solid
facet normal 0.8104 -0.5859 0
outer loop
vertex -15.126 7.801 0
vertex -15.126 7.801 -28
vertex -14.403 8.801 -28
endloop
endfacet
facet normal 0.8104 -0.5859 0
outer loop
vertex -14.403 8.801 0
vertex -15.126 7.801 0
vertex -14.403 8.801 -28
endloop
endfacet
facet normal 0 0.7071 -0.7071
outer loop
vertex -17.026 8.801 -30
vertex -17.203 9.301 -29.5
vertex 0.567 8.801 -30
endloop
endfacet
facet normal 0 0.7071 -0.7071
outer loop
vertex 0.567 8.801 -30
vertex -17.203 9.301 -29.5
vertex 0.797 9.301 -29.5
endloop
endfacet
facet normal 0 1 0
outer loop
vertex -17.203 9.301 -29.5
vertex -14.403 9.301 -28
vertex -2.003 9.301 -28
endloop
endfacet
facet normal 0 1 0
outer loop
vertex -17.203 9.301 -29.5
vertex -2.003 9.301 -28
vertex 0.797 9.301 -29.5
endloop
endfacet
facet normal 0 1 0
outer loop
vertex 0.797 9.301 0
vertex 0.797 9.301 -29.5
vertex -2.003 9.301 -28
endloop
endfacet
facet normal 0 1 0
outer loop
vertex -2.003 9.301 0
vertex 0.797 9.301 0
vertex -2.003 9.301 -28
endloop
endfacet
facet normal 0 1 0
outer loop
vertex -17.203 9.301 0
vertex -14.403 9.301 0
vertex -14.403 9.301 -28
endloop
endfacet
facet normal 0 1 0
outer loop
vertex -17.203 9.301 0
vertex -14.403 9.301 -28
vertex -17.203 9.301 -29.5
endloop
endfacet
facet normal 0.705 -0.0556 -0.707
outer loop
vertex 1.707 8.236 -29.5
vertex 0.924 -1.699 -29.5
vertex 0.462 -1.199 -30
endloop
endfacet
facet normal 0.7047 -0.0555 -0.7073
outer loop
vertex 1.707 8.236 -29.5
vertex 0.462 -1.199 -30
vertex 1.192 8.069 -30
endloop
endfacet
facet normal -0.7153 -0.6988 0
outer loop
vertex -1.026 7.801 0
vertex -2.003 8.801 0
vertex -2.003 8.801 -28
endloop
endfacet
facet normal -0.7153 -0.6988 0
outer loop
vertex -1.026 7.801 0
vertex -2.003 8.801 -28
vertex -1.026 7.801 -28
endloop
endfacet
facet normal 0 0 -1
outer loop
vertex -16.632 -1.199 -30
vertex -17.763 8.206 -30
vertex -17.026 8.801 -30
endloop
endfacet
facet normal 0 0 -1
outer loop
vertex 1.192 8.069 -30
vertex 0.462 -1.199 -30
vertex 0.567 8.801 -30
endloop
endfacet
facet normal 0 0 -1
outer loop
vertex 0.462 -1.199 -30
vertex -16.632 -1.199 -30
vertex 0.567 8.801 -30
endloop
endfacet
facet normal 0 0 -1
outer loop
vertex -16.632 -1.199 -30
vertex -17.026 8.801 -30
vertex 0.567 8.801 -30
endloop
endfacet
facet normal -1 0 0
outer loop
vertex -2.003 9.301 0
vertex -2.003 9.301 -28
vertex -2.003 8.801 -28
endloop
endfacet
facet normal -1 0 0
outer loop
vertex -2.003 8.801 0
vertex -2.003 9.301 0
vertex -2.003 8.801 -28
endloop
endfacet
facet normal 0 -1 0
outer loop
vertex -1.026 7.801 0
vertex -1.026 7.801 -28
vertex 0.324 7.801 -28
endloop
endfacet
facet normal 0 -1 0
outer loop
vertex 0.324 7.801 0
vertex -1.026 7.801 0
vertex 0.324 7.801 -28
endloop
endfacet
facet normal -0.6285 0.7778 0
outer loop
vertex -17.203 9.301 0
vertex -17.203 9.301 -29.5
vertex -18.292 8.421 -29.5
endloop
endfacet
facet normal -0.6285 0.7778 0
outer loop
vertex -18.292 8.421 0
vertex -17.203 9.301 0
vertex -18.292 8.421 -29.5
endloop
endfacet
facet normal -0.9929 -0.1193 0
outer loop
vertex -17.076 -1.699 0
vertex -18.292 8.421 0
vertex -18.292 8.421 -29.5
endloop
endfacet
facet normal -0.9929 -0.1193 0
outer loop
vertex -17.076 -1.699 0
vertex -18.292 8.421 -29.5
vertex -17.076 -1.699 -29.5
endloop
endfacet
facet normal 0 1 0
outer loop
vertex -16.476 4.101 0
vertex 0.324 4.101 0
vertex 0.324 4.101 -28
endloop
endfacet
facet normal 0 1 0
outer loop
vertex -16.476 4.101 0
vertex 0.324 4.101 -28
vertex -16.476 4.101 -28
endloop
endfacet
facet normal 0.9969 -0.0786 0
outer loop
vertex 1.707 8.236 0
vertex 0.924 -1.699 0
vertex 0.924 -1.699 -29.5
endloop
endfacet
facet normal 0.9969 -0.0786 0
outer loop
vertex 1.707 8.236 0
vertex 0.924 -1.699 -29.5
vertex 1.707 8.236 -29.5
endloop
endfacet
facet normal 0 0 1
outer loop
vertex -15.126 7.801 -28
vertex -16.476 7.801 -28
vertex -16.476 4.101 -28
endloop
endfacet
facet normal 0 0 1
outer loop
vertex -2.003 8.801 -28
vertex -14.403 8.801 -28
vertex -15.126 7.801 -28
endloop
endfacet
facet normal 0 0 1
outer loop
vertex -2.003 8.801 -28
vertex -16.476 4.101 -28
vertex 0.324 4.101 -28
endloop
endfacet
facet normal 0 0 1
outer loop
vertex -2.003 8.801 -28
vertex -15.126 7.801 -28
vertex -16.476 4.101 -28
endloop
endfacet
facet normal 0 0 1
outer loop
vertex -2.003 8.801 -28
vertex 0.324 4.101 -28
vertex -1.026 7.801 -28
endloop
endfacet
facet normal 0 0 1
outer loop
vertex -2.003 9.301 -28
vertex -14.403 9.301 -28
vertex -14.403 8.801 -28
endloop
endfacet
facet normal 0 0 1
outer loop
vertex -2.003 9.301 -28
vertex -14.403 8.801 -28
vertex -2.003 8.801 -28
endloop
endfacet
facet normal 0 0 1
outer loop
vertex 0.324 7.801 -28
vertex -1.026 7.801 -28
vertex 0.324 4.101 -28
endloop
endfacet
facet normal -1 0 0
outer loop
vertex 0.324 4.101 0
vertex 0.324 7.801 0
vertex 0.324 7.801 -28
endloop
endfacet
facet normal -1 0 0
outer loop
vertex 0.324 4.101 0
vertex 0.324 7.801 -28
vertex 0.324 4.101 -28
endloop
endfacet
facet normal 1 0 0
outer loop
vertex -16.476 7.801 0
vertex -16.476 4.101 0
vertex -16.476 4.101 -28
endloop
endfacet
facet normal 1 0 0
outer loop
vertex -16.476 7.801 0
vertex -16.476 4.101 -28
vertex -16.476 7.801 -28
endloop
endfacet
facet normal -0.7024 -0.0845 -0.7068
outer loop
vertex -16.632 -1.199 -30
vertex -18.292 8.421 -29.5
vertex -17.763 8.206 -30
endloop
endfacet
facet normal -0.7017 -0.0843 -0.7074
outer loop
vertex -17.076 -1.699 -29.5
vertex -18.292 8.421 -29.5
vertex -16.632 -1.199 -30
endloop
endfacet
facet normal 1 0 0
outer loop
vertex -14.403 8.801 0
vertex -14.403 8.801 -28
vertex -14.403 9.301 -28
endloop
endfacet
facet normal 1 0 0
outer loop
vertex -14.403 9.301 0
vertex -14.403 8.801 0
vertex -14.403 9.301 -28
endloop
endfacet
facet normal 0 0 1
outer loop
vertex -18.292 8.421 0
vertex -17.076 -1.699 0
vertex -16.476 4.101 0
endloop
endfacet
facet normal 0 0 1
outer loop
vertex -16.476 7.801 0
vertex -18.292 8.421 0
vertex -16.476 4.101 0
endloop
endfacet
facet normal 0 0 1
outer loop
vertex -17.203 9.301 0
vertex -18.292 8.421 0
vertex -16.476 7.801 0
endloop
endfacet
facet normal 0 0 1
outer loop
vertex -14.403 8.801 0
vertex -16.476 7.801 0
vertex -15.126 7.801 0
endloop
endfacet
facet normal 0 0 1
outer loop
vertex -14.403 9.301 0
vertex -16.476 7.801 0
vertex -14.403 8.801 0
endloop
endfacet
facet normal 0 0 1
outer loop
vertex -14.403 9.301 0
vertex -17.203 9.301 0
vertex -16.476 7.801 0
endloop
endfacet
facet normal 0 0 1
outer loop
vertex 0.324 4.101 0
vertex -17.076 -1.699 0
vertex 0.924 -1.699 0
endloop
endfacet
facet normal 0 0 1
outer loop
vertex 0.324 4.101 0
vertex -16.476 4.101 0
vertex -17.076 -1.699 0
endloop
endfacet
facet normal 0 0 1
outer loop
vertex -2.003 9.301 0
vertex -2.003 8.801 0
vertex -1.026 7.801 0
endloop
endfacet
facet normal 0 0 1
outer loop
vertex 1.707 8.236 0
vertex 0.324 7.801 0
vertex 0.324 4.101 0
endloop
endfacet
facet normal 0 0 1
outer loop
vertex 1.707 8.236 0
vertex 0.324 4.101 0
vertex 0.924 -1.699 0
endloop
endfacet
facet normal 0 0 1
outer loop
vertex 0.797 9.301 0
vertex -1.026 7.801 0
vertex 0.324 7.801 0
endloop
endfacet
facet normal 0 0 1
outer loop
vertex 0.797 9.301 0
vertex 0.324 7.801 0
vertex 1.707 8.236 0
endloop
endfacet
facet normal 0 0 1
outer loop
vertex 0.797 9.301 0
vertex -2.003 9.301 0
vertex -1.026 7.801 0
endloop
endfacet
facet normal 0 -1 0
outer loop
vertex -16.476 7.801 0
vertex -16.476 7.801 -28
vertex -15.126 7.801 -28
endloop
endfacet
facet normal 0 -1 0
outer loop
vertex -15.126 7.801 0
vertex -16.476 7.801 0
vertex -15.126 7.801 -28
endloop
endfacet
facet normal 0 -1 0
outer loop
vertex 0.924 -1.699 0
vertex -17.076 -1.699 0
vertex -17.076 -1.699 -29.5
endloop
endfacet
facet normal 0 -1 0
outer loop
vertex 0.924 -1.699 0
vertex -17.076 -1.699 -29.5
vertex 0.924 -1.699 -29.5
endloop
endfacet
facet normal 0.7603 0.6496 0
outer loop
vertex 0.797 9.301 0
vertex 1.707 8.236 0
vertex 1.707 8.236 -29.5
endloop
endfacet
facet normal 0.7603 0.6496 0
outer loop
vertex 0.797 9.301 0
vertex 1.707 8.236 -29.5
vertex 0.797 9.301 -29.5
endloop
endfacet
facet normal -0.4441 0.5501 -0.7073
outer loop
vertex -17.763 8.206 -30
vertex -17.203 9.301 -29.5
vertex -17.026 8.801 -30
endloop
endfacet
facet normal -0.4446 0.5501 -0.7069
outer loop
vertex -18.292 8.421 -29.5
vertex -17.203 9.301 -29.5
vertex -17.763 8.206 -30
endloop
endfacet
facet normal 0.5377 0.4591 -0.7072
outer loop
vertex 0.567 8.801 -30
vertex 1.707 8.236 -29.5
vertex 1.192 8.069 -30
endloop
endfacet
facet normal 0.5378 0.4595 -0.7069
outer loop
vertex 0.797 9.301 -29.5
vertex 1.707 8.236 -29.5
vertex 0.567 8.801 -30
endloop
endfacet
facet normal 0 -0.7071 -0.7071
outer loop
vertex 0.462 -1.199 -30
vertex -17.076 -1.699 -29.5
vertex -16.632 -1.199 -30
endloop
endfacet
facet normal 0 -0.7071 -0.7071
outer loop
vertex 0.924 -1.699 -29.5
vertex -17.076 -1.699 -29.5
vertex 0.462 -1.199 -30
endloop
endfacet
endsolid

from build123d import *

# Parameters (mm, degrees)
BOSS_EXTRUDE1_DEPTH = 30
BOSS_EXTRUDE2_DEPTH = 2
CHAMFER8_SIZE       = 0.5


with BuildPart() as part:
    # Sketch1 → Boss-Extrude1 (new body)
    with BuildSketch(Plane.XY):
        Polygon((-17.075998832, -1.699461634), (0.924001168, -1.699461634), (1.706939946, 8.236405705), (0.797202797, 9.300538366), (-2.002797203, 9.300538366), (-2.002797203, 8.800538366), (-1.025998832, 7.800538366), (0.324001168, 7.800538366), (0.324001168, 4.100538366), (-16.475998832, 4.100538366), (-16.475998832, 7.800538366), (-15.125998832, 7.800538366), (-14.402797203, 8.800538366), (-14.402797203, 9.300538366), (-17.202797203, 9.300538366), (-18.292206063, 8.421227081), align=None)
    extrude(amount=-BOSS_EXTRUDE1_DEPTH)

    # Sketch2 → Boss-Extrude2 (add)
    with BuildSketch(Plane(origin=(0, 0, -30), x_dir=(-1, 0, 0), z_dir=(0, 0, -1))):
        Polygon((2.002797203, 9.300538366), (14.402797203, 9.300538366), (16.475998832, 9.300538366), (16.475998832, 4.100538366), (-0.324001168, 4.100538366), (-0.324001168, 9.300538366), align=None)
    extrude(amount=-BOSS_EXTRUDE2_DEPTH)

    # Chamfer8
    chamfer8_edges = [part.edges().sort_by_distance(p)[0] for p in [
        (1.315470557, 3.268472036, -30),
        (1.252071371, 8.768472036, -30),
        (-8.202797203, 9.300538366, -30),
        (-17.684102447, 3.360882724, -30),
        (-17.747501633, 8.860882724, -30),
        (-8.075998832, -1.699461634, -30),
    ]]
    chamfer(chamfer8_edges, length=CHAMFER8_SIZE)


solid = part.part
